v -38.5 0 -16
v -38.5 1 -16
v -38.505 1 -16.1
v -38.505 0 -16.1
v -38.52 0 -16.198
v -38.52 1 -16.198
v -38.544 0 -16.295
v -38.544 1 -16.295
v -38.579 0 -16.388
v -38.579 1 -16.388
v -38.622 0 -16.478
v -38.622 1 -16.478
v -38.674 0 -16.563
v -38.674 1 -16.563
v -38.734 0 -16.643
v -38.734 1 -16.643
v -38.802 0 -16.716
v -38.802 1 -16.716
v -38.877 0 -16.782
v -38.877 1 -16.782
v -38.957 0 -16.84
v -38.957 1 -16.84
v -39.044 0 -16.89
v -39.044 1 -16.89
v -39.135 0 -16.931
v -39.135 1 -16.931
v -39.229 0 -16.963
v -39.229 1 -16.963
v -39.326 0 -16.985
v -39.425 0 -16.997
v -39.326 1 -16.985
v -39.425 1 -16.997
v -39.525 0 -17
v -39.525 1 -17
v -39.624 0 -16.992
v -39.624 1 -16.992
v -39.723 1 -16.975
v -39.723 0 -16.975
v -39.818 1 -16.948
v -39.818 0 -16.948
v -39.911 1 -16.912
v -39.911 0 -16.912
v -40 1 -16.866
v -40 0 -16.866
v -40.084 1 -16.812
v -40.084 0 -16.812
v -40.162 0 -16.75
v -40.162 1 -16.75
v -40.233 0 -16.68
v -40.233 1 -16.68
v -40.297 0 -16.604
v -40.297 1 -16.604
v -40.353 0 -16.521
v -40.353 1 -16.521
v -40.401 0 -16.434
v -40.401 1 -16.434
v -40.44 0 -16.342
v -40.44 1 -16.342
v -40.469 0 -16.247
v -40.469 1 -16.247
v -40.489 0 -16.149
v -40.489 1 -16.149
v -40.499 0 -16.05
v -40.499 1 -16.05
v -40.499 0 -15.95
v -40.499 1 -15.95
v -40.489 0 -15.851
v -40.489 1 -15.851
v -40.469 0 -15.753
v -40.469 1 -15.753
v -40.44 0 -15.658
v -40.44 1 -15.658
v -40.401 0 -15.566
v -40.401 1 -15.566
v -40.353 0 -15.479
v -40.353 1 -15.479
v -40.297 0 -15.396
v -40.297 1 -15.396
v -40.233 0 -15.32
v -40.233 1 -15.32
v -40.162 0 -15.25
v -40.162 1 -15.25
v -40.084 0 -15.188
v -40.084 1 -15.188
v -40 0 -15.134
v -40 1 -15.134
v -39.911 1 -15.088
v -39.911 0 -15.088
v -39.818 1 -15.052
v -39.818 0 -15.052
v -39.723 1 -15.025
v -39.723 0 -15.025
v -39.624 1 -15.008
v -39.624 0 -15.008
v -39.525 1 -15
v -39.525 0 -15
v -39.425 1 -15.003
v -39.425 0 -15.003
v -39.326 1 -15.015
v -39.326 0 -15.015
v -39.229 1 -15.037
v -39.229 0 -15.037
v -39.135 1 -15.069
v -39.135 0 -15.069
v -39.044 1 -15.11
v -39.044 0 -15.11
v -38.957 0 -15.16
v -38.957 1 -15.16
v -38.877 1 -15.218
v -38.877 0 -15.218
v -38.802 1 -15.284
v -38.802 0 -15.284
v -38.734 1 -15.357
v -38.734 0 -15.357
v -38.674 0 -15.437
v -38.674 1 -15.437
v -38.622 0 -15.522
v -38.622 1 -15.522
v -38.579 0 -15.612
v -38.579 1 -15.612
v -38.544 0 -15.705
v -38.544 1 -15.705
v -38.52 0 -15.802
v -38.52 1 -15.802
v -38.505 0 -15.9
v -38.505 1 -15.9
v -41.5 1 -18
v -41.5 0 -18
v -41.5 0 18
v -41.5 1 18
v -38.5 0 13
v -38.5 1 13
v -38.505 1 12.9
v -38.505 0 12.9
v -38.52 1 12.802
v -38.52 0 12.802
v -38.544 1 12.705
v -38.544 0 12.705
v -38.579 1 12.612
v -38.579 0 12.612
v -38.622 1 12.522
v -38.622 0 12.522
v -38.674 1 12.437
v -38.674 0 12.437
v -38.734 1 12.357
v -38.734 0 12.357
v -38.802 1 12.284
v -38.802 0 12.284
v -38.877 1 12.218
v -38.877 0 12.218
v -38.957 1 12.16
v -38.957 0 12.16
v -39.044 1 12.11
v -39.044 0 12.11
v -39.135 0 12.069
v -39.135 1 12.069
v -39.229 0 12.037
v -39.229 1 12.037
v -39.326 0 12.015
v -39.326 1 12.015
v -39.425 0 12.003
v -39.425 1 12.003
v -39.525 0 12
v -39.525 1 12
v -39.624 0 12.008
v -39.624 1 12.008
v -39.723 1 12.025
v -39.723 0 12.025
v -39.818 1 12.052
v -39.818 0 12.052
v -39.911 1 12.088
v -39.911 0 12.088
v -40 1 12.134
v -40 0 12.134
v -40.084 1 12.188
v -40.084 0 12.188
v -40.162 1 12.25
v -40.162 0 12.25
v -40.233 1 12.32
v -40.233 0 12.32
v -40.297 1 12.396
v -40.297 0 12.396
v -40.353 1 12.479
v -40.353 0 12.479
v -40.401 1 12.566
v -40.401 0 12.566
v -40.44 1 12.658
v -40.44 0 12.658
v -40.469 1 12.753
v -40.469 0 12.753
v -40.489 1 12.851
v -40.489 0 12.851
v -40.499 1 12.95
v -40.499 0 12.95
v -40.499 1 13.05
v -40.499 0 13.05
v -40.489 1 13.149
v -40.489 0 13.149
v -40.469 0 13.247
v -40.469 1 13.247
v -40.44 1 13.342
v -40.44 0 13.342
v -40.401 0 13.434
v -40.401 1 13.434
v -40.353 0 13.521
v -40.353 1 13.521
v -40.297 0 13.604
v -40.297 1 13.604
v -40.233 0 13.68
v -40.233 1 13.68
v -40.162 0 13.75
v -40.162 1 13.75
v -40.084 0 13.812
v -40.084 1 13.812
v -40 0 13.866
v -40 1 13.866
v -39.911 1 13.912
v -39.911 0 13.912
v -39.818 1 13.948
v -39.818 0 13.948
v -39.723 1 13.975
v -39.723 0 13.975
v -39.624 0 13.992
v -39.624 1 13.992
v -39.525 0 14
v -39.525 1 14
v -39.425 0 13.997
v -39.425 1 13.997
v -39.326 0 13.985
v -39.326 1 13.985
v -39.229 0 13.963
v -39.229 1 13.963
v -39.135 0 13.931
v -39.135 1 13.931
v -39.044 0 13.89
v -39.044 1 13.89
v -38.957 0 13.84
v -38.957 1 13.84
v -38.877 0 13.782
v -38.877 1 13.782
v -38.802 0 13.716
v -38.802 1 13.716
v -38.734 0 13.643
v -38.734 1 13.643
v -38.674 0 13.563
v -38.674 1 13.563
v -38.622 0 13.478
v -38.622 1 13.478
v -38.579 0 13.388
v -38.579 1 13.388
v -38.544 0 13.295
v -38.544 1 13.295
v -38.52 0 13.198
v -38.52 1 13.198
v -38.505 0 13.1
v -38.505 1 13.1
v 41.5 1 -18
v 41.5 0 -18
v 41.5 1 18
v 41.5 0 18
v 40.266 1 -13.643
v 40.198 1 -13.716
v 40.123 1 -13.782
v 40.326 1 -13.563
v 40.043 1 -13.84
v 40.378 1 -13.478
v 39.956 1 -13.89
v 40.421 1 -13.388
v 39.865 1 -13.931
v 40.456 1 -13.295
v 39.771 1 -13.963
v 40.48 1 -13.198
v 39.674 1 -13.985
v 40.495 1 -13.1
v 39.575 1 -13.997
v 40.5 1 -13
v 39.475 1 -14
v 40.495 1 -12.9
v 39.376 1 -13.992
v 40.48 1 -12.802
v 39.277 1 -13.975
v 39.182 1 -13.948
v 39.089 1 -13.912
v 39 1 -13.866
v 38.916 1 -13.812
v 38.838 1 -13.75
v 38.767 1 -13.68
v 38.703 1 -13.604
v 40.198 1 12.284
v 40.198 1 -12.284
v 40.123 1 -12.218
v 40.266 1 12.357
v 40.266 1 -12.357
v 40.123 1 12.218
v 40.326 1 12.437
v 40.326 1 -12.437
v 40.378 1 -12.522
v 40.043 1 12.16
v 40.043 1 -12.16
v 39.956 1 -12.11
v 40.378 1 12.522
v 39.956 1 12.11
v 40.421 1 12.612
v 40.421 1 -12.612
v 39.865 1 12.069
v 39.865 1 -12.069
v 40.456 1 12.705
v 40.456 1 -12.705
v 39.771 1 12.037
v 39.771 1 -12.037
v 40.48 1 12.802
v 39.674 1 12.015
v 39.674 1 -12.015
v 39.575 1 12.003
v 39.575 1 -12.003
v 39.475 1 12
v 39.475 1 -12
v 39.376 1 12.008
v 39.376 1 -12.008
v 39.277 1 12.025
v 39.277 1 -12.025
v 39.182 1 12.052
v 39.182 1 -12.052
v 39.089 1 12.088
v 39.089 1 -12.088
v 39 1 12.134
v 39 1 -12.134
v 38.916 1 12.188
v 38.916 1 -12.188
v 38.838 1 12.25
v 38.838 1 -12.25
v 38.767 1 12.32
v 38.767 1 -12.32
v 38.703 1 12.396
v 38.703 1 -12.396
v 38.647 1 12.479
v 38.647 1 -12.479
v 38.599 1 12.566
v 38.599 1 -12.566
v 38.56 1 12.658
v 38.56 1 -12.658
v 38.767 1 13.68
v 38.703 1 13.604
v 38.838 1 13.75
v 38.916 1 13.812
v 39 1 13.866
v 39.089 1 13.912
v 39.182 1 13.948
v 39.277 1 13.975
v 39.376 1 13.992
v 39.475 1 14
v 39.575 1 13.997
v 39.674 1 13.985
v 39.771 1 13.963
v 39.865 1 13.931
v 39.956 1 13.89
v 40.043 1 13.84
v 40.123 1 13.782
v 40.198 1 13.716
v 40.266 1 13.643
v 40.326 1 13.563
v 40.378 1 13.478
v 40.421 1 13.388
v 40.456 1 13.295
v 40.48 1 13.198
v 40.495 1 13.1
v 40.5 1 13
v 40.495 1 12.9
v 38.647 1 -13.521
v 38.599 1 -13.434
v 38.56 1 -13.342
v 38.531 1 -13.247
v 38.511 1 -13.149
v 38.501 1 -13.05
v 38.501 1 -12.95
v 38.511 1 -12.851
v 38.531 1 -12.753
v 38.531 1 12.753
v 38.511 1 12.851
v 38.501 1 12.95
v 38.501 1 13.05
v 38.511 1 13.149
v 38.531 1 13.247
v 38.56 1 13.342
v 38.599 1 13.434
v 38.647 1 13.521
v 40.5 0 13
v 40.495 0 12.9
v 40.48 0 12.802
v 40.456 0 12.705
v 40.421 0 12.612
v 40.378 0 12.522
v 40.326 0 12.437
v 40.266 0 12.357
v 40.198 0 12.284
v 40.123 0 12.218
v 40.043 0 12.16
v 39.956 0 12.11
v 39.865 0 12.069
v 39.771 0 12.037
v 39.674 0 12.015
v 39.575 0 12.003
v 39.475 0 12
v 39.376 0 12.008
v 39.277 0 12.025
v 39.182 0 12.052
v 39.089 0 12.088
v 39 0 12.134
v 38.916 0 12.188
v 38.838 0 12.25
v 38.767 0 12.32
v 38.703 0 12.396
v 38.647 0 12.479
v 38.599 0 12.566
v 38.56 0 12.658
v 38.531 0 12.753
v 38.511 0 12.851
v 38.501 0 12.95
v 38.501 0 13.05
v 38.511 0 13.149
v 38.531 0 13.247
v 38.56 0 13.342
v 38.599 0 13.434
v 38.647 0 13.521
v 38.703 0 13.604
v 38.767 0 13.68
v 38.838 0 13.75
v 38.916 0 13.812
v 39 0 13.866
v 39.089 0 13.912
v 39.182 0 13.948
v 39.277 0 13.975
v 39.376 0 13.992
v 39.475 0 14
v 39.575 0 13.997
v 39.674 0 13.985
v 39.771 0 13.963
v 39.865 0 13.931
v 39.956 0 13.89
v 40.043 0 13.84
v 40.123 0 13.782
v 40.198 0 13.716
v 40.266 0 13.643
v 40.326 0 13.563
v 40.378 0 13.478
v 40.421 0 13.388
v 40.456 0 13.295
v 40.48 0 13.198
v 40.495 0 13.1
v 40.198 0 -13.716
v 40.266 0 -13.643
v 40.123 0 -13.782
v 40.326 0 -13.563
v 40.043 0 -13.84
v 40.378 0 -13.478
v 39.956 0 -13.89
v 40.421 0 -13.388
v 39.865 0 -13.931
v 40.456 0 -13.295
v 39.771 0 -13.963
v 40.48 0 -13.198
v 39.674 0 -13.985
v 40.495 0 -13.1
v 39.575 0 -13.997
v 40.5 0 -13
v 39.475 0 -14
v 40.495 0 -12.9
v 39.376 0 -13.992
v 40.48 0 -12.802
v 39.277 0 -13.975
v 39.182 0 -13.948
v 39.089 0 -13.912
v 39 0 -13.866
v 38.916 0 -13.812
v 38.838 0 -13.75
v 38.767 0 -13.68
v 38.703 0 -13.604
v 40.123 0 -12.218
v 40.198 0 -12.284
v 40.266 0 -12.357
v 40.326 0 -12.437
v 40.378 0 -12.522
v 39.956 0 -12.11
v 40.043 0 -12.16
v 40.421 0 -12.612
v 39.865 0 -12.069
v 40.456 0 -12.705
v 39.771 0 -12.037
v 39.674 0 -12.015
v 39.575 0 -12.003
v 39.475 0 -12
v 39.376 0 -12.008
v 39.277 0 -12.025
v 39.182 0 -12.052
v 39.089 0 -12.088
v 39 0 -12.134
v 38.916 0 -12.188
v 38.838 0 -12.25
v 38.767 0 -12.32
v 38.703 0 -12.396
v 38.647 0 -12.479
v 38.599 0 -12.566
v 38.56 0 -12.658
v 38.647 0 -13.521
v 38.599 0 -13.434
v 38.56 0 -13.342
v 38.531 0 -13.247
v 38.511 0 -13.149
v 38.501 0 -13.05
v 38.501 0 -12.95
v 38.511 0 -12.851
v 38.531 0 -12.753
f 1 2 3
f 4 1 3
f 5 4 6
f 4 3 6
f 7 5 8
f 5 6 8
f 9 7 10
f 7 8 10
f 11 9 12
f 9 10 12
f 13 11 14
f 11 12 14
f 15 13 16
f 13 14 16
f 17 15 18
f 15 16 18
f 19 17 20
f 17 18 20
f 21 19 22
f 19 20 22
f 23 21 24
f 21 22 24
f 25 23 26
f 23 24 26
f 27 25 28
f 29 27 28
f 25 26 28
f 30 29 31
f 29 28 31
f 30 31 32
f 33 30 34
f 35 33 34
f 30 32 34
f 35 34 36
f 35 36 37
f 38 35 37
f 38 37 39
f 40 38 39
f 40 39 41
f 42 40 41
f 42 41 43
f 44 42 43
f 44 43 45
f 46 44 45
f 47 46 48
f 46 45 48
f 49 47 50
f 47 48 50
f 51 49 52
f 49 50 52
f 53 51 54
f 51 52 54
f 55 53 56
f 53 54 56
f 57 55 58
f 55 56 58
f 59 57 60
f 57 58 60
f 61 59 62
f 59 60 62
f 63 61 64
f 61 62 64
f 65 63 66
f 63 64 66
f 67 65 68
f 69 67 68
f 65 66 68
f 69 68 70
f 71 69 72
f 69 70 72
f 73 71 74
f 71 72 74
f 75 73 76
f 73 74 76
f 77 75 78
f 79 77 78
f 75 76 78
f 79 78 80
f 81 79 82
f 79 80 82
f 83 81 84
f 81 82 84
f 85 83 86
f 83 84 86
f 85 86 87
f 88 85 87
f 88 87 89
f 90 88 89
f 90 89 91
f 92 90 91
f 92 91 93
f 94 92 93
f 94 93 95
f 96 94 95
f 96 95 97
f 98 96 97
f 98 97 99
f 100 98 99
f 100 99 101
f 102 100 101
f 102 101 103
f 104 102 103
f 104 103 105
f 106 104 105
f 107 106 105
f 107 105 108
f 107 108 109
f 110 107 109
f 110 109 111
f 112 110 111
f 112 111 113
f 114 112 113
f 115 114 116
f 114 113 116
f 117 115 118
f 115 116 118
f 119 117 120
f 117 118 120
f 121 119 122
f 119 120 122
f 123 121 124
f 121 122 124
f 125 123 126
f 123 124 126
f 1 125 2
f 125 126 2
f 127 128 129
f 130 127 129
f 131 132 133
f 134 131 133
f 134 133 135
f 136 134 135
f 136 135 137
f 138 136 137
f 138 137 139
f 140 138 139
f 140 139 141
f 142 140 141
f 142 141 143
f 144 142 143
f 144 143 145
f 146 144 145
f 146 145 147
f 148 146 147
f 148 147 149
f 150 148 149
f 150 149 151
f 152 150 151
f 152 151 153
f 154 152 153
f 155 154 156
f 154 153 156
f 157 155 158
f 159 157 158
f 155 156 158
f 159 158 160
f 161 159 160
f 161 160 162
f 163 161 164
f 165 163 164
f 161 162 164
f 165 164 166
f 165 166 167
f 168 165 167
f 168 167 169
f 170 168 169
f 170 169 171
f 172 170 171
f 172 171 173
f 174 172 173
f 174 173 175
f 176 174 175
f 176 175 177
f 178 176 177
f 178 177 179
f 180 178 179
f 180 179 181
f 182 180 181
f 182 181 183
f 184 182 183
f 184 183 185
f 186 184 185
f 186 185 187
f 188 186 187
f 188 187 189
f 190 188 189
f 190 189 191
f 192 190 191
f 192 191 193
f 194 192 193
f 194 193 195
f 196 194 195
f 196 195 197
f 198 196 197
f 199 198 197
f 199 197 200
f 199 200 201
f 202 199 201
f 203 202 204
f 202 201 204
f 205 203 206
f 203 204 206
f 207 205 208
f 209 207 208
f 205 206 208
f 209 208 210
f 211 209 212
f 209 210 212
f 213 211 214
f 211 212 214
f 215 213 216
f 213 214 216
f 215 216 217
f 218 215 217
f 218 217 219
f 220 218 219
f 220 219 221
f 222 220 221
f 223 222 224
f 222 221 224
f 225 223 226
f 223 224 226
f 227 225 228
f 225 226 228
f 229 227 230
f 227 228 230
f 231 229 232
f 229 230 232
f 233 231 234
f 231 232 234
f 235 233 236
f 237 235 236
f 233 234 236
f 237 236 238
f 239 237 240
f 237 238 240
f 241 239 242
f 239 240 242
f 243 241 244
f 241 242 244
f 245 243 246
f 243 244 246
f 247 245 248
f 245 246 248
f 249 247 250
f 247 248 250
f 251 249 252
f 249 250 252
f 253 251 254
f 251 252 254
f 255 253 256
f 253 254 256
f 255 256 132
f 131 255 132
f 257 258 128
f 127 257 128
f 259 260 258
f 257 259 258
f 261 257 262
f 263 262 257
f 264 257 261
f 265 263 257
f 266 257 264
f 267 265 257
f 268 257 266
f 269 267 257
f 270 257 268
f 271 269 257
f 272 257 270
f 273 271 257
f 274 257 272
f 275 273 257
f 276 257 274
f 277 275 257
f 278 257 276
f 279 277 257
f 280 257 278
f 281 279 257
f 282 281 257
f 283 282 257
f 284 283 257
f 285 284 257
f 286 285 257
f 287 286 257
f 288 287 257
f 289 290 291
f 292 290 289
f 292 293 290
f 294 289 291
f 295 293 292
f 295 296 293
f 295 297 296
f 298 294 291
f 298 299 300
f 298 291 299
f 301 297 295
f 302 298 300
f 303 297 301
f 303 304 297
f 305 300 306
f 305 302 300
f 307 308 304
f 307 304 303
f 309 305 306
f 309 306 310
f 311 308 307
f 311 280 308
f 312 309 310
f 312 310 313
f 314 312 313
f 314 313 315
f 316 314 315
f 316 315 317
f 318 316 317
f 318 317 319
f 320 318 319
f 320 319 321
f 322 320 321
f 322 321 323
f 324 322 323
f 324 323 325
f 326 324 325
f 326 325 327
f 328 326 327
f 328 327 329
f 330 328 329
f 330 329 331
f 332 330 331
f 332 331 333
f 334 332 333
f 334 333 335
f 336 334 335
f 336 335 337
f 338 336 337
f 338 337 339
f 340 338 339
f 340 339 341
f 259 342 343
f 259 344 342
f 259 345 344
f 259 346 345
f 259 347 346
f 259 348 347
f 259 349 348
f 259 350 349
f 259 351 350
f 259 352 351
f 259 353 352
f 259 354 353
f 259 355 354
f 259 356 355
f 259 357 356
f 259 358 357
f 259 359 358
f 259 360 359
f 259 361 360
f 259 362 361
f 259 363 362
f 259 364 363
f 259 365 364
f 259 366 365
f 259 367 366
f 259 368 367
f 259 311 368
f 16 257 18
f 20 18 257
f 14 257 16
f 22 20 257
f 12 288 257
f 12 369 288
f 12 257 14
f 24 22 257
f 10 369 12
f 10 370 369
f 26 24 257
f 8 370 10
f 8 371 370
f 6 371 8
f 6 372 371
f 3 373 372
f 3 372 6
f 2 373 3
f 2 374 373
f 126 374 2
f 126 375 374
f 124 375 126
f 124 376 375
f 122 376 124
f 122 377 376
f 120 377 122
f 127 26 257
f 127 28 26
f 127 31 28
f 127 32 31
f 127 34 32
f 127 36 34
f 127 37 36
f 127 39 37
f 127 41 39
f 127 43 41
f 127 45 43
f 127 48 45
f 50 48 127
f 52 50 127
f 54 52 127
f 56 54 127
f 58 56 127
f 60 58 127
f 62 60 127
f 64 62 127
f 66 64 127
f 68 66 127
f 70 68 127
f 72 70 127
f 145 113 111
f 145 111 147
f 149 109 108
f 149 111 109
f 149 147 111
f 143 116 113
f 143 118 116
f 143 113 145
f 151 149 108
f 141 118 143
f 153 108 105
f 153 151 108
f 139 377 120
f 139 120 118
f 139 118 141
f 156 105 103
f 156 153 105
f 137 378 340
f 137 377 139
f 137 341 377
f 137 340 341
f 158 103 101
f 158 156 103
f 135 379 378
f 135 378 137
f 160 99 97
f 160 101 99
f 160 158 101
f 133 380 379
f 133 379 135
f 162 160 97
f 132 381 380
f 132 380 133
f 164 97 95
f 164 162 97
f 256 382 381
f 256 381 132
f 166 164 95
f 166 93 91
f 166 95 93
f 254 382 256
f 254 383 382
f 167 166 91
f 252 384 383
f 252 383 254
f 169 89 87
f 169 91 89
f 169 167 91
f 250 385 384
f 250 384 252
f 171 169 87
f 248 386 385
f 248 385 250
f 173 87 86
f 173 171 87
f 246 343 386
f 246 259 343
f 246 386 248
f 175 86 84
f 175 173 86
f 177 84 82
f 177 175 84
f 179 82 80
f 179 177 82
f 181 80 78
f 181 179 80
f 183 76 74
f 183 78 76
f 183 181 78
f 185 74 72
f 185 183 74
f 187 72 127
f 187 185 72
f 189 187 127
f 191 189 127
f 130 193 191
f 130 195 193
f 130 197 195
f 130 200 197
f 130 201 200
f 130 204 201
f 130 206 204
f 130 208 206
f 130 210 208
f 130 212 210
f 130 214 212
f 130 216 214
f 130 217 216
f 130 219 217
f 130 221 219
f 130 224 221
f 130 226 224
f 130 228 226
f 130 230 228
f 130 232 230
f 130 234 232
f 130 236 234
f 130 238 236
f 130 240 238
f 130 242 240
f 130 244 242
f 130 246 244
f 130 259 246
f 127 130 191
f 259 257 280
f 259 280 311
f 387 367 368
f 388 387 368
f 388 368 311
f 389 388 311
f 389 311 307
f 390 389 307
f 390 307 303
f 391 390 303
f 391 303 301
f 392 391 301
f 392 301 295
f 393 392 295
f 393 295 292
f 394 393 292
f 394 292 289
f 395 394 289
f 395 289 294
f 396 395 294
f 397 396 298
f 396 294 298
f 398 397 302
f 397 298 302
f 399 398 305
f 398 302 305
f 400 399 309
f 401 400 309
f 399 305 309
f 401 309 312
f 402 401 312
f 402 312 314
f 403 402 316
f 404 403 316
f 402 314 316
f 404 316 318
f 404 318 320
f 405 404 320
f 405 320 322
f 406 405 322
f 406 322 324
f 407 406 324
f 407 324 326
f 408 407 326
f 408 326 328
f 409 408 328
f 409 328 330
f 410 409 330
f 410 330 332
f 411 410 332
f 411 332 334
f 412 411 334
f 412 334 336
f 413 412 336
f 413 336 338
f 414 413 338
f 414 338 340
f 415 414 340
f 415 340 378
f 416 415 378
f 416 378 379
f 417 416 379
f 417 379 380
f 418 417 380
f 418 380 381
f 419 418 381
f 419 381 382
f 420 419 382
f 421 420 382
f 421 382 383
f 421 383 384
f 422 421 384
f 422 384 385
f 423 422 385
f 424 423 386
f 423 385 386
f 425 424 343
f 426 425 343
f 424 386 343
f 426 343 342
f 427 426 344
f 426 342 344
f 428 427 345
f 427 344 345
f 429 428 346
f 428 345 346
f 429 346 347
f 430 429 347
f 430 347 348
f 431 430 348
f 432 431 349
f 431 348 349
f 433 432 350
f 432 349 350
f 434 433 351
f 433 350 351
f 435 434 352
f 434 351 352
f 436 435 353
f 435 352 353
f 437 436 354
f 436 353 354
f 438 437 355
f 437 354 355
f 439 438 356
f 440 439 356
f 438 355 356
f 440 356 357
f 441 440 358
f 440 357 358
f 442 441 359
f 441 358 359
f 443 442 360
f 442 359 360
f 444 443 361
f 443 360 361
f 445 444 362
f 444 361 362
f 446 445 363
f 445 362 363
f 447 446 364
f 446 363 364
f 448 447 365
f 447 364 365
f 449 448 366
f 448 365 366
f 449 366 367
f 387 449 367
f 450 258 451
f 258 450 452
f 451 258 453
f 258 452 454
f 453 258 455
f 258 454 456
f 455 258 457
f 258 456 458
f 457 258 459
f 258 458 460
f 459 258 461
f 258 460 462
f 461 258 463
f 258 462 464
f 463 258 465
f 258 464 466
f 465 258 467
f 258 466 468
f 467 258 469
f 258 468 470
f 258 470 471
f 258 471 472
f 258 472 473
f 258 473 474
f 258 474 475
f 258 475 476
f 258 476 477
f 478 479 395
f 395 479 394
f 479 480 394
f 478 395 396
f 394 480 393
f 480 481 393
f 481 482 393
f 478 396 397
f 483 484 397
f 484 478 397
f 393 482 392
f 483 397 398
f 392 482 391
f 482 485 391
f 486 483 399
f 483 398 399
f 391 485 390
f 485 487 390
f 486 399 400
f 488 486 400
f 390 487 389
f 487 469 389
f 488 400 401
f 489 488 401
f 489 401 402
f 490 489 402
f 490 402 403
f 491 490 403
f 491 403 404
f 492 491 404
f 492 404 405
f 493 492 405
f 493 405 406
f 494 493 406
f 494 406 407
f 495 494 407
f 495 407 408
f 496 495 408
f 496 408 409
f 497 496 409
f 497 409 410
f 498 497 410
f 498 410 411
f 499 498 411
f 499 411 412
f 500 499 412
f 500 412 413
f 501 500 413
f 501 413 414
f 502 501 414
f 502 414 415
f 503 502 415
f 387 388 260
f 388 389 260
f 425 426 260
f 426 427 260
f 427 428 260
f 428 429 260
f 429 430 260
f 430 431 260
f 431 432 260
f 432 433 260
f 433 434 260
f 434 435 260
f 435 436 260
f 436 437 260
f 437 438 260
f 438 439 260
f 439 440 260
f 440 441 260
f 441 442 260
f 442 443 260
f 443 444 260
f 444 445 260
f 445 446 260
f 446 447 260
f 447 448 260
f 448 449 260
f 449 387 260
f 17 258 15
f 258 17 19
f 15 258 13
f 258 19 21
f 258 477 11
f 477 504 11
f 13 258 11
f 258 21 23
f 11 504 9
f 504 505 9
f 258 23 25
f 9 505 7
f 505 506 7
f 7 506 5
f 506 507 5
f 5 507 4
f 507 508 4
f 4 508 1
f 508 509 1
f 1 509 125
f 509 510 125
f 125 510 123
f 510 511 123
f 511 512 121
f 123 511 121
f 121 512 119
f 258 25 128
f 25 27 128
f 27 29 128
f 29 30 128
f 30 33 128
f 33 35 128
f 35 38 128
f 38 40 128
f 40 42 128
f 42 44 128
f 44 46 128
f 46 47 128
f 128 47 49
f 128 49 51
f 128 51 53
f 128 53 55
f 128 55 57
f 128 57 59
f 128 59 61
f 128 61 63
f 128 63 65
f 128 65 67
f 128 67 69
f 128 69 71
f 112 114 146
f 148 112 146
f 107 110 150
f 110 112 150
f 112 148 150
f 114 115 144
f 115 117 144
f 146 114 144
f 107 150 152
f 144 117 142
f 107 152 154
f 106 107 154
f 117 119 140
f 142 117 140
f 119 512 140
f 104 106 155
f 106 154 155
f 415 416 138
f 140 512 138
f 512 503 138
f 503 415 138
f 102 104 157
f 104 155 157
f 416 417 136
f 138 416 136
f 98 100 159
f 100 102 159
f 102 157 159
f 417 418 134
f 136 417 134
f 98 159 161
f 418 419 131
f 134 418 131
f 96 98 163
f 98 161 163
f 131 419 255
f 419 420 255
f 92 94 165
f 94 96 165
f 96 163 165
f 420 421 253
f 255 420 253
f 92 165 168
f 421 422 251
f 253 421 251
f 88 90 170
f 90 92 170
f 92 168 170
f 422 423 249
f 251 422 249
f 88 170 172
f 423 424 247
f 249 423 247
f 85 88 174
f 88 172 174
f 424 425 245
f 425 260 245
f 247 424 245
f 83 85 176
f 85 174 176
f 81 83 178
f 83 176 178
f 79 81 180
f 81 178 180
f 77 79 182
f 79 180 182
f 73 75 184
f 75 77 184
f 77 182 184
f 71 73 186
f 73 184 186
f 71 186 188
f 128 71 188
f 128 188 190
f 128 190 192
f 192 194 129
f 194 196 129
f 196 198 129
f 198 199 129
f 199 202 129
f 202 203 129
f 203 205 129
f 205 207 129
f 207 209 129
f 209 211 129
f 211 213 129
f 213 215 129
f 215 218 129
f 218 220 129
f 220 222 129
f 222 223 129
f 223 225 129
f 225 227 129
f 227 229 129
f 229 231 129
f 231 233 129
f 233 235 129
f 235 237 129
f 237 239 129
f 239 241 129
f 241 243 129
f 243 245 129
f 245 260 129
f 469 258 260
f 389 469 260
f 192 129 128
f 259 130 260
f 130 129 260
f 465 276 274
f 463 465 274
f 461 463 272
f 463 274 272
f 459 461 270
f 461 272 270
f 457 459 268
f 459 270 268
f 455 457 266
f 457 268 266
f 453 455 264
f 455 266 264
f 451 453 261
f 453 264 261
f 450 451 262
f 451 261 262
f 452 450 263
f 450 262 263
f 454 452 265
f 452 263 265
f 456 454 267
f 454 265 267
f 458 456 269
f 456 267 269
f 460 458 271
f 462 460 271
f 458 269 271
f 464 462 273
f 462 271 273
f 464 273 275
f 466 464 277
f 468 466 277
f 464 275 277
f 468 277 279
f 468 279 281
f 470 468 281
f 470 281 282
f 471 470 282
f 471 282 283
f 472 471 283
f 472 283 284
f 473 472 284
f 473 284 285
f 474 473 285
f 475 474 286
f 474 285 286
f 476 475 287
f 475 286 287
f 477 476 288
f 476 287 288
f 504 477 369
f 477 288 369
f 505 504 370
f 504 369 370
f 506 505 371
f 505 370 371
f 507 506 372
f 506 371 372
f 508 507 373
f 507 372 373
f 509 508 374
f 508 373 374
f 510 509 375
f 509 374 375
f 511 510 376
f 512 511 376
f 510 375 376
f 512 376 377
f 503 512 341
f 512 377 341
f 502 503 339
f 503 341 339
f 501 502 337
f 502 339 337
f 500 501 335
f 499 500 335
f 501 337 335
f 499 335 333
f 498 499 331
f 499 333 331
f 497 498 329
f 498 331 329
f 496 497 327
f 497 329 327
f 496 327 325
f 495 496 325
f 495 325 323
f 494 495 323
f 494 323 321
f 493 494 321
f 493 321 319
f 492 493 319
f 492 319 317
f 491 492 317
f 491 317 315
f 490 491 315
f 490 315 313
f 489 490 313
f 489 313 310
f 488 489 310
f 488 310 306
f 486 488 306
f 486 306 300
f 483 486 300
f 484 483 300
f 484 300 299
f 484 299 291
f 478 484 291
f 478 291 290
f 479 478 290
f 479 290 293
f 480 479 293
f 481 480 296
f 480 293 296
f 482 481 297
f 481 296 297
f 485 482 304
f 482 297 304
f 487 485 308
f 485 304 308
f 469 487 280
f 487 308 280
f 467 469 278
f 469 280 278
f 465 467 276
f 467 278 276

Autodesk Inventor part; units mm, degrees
ref_plane "YZ Plane" through (0, 0, 0) normal (1, 0, 0) x (0, 1, 0)
ref_plane "XZ Plane" through (0, 0, 0) normal (0, 1, 0) x (-1, 0, 0)
ref_plane "XY Plane" through (0, 0, 0) normal (0, 0, 1) x (1, 0, 0)
sketch "Boceto1" plane through (0, 0, 0) normal (0, 1, 0) x (-1, 0, 0)
  line L0 (41.5, 18) -> (-41.5, 18)
  line L1 (-41.5, 18) -> (-41.5, -18)
  line L2 (-41.5, -18) -> (41.5, -18)
  line L3 (41.5, -18) -> (41.5, 18)
  line L4 (41.5, 18) -> (-41.5, -18) construction
  line L5 (-41.5, 18) -> (41.5, -18) construction
  point P0 (0, 0)
  dimension "d0" = 83
  dimension "d1" = 36
extrude "Extrusión1" add sketch "Boceto1" along normal blind 1
sketch "Boceto2" plane through (0, 1, 0) normal (0, 1, 0) x (1, 0, 0)
  line L0 (41.5, 18) -> (-41.5, 18) projected
  line L1 (-41.5, 18) -> (-18.7131, 18) construction
  circle A0 centre (-39.5, 16) radius 1
  circle A1 centre (39.5, 13) radius 1
  circle A2 centre (-39.5, -13) radius 1
  circle A3 centre (39.5, -13) radius 1
  point P0 (0, 0)
  dimension "d5" = 2
  dimension "d6" = 2
extrude "Extrusión2" cut sketch "Boceto2" against normal through all
properties part number "PCB"
